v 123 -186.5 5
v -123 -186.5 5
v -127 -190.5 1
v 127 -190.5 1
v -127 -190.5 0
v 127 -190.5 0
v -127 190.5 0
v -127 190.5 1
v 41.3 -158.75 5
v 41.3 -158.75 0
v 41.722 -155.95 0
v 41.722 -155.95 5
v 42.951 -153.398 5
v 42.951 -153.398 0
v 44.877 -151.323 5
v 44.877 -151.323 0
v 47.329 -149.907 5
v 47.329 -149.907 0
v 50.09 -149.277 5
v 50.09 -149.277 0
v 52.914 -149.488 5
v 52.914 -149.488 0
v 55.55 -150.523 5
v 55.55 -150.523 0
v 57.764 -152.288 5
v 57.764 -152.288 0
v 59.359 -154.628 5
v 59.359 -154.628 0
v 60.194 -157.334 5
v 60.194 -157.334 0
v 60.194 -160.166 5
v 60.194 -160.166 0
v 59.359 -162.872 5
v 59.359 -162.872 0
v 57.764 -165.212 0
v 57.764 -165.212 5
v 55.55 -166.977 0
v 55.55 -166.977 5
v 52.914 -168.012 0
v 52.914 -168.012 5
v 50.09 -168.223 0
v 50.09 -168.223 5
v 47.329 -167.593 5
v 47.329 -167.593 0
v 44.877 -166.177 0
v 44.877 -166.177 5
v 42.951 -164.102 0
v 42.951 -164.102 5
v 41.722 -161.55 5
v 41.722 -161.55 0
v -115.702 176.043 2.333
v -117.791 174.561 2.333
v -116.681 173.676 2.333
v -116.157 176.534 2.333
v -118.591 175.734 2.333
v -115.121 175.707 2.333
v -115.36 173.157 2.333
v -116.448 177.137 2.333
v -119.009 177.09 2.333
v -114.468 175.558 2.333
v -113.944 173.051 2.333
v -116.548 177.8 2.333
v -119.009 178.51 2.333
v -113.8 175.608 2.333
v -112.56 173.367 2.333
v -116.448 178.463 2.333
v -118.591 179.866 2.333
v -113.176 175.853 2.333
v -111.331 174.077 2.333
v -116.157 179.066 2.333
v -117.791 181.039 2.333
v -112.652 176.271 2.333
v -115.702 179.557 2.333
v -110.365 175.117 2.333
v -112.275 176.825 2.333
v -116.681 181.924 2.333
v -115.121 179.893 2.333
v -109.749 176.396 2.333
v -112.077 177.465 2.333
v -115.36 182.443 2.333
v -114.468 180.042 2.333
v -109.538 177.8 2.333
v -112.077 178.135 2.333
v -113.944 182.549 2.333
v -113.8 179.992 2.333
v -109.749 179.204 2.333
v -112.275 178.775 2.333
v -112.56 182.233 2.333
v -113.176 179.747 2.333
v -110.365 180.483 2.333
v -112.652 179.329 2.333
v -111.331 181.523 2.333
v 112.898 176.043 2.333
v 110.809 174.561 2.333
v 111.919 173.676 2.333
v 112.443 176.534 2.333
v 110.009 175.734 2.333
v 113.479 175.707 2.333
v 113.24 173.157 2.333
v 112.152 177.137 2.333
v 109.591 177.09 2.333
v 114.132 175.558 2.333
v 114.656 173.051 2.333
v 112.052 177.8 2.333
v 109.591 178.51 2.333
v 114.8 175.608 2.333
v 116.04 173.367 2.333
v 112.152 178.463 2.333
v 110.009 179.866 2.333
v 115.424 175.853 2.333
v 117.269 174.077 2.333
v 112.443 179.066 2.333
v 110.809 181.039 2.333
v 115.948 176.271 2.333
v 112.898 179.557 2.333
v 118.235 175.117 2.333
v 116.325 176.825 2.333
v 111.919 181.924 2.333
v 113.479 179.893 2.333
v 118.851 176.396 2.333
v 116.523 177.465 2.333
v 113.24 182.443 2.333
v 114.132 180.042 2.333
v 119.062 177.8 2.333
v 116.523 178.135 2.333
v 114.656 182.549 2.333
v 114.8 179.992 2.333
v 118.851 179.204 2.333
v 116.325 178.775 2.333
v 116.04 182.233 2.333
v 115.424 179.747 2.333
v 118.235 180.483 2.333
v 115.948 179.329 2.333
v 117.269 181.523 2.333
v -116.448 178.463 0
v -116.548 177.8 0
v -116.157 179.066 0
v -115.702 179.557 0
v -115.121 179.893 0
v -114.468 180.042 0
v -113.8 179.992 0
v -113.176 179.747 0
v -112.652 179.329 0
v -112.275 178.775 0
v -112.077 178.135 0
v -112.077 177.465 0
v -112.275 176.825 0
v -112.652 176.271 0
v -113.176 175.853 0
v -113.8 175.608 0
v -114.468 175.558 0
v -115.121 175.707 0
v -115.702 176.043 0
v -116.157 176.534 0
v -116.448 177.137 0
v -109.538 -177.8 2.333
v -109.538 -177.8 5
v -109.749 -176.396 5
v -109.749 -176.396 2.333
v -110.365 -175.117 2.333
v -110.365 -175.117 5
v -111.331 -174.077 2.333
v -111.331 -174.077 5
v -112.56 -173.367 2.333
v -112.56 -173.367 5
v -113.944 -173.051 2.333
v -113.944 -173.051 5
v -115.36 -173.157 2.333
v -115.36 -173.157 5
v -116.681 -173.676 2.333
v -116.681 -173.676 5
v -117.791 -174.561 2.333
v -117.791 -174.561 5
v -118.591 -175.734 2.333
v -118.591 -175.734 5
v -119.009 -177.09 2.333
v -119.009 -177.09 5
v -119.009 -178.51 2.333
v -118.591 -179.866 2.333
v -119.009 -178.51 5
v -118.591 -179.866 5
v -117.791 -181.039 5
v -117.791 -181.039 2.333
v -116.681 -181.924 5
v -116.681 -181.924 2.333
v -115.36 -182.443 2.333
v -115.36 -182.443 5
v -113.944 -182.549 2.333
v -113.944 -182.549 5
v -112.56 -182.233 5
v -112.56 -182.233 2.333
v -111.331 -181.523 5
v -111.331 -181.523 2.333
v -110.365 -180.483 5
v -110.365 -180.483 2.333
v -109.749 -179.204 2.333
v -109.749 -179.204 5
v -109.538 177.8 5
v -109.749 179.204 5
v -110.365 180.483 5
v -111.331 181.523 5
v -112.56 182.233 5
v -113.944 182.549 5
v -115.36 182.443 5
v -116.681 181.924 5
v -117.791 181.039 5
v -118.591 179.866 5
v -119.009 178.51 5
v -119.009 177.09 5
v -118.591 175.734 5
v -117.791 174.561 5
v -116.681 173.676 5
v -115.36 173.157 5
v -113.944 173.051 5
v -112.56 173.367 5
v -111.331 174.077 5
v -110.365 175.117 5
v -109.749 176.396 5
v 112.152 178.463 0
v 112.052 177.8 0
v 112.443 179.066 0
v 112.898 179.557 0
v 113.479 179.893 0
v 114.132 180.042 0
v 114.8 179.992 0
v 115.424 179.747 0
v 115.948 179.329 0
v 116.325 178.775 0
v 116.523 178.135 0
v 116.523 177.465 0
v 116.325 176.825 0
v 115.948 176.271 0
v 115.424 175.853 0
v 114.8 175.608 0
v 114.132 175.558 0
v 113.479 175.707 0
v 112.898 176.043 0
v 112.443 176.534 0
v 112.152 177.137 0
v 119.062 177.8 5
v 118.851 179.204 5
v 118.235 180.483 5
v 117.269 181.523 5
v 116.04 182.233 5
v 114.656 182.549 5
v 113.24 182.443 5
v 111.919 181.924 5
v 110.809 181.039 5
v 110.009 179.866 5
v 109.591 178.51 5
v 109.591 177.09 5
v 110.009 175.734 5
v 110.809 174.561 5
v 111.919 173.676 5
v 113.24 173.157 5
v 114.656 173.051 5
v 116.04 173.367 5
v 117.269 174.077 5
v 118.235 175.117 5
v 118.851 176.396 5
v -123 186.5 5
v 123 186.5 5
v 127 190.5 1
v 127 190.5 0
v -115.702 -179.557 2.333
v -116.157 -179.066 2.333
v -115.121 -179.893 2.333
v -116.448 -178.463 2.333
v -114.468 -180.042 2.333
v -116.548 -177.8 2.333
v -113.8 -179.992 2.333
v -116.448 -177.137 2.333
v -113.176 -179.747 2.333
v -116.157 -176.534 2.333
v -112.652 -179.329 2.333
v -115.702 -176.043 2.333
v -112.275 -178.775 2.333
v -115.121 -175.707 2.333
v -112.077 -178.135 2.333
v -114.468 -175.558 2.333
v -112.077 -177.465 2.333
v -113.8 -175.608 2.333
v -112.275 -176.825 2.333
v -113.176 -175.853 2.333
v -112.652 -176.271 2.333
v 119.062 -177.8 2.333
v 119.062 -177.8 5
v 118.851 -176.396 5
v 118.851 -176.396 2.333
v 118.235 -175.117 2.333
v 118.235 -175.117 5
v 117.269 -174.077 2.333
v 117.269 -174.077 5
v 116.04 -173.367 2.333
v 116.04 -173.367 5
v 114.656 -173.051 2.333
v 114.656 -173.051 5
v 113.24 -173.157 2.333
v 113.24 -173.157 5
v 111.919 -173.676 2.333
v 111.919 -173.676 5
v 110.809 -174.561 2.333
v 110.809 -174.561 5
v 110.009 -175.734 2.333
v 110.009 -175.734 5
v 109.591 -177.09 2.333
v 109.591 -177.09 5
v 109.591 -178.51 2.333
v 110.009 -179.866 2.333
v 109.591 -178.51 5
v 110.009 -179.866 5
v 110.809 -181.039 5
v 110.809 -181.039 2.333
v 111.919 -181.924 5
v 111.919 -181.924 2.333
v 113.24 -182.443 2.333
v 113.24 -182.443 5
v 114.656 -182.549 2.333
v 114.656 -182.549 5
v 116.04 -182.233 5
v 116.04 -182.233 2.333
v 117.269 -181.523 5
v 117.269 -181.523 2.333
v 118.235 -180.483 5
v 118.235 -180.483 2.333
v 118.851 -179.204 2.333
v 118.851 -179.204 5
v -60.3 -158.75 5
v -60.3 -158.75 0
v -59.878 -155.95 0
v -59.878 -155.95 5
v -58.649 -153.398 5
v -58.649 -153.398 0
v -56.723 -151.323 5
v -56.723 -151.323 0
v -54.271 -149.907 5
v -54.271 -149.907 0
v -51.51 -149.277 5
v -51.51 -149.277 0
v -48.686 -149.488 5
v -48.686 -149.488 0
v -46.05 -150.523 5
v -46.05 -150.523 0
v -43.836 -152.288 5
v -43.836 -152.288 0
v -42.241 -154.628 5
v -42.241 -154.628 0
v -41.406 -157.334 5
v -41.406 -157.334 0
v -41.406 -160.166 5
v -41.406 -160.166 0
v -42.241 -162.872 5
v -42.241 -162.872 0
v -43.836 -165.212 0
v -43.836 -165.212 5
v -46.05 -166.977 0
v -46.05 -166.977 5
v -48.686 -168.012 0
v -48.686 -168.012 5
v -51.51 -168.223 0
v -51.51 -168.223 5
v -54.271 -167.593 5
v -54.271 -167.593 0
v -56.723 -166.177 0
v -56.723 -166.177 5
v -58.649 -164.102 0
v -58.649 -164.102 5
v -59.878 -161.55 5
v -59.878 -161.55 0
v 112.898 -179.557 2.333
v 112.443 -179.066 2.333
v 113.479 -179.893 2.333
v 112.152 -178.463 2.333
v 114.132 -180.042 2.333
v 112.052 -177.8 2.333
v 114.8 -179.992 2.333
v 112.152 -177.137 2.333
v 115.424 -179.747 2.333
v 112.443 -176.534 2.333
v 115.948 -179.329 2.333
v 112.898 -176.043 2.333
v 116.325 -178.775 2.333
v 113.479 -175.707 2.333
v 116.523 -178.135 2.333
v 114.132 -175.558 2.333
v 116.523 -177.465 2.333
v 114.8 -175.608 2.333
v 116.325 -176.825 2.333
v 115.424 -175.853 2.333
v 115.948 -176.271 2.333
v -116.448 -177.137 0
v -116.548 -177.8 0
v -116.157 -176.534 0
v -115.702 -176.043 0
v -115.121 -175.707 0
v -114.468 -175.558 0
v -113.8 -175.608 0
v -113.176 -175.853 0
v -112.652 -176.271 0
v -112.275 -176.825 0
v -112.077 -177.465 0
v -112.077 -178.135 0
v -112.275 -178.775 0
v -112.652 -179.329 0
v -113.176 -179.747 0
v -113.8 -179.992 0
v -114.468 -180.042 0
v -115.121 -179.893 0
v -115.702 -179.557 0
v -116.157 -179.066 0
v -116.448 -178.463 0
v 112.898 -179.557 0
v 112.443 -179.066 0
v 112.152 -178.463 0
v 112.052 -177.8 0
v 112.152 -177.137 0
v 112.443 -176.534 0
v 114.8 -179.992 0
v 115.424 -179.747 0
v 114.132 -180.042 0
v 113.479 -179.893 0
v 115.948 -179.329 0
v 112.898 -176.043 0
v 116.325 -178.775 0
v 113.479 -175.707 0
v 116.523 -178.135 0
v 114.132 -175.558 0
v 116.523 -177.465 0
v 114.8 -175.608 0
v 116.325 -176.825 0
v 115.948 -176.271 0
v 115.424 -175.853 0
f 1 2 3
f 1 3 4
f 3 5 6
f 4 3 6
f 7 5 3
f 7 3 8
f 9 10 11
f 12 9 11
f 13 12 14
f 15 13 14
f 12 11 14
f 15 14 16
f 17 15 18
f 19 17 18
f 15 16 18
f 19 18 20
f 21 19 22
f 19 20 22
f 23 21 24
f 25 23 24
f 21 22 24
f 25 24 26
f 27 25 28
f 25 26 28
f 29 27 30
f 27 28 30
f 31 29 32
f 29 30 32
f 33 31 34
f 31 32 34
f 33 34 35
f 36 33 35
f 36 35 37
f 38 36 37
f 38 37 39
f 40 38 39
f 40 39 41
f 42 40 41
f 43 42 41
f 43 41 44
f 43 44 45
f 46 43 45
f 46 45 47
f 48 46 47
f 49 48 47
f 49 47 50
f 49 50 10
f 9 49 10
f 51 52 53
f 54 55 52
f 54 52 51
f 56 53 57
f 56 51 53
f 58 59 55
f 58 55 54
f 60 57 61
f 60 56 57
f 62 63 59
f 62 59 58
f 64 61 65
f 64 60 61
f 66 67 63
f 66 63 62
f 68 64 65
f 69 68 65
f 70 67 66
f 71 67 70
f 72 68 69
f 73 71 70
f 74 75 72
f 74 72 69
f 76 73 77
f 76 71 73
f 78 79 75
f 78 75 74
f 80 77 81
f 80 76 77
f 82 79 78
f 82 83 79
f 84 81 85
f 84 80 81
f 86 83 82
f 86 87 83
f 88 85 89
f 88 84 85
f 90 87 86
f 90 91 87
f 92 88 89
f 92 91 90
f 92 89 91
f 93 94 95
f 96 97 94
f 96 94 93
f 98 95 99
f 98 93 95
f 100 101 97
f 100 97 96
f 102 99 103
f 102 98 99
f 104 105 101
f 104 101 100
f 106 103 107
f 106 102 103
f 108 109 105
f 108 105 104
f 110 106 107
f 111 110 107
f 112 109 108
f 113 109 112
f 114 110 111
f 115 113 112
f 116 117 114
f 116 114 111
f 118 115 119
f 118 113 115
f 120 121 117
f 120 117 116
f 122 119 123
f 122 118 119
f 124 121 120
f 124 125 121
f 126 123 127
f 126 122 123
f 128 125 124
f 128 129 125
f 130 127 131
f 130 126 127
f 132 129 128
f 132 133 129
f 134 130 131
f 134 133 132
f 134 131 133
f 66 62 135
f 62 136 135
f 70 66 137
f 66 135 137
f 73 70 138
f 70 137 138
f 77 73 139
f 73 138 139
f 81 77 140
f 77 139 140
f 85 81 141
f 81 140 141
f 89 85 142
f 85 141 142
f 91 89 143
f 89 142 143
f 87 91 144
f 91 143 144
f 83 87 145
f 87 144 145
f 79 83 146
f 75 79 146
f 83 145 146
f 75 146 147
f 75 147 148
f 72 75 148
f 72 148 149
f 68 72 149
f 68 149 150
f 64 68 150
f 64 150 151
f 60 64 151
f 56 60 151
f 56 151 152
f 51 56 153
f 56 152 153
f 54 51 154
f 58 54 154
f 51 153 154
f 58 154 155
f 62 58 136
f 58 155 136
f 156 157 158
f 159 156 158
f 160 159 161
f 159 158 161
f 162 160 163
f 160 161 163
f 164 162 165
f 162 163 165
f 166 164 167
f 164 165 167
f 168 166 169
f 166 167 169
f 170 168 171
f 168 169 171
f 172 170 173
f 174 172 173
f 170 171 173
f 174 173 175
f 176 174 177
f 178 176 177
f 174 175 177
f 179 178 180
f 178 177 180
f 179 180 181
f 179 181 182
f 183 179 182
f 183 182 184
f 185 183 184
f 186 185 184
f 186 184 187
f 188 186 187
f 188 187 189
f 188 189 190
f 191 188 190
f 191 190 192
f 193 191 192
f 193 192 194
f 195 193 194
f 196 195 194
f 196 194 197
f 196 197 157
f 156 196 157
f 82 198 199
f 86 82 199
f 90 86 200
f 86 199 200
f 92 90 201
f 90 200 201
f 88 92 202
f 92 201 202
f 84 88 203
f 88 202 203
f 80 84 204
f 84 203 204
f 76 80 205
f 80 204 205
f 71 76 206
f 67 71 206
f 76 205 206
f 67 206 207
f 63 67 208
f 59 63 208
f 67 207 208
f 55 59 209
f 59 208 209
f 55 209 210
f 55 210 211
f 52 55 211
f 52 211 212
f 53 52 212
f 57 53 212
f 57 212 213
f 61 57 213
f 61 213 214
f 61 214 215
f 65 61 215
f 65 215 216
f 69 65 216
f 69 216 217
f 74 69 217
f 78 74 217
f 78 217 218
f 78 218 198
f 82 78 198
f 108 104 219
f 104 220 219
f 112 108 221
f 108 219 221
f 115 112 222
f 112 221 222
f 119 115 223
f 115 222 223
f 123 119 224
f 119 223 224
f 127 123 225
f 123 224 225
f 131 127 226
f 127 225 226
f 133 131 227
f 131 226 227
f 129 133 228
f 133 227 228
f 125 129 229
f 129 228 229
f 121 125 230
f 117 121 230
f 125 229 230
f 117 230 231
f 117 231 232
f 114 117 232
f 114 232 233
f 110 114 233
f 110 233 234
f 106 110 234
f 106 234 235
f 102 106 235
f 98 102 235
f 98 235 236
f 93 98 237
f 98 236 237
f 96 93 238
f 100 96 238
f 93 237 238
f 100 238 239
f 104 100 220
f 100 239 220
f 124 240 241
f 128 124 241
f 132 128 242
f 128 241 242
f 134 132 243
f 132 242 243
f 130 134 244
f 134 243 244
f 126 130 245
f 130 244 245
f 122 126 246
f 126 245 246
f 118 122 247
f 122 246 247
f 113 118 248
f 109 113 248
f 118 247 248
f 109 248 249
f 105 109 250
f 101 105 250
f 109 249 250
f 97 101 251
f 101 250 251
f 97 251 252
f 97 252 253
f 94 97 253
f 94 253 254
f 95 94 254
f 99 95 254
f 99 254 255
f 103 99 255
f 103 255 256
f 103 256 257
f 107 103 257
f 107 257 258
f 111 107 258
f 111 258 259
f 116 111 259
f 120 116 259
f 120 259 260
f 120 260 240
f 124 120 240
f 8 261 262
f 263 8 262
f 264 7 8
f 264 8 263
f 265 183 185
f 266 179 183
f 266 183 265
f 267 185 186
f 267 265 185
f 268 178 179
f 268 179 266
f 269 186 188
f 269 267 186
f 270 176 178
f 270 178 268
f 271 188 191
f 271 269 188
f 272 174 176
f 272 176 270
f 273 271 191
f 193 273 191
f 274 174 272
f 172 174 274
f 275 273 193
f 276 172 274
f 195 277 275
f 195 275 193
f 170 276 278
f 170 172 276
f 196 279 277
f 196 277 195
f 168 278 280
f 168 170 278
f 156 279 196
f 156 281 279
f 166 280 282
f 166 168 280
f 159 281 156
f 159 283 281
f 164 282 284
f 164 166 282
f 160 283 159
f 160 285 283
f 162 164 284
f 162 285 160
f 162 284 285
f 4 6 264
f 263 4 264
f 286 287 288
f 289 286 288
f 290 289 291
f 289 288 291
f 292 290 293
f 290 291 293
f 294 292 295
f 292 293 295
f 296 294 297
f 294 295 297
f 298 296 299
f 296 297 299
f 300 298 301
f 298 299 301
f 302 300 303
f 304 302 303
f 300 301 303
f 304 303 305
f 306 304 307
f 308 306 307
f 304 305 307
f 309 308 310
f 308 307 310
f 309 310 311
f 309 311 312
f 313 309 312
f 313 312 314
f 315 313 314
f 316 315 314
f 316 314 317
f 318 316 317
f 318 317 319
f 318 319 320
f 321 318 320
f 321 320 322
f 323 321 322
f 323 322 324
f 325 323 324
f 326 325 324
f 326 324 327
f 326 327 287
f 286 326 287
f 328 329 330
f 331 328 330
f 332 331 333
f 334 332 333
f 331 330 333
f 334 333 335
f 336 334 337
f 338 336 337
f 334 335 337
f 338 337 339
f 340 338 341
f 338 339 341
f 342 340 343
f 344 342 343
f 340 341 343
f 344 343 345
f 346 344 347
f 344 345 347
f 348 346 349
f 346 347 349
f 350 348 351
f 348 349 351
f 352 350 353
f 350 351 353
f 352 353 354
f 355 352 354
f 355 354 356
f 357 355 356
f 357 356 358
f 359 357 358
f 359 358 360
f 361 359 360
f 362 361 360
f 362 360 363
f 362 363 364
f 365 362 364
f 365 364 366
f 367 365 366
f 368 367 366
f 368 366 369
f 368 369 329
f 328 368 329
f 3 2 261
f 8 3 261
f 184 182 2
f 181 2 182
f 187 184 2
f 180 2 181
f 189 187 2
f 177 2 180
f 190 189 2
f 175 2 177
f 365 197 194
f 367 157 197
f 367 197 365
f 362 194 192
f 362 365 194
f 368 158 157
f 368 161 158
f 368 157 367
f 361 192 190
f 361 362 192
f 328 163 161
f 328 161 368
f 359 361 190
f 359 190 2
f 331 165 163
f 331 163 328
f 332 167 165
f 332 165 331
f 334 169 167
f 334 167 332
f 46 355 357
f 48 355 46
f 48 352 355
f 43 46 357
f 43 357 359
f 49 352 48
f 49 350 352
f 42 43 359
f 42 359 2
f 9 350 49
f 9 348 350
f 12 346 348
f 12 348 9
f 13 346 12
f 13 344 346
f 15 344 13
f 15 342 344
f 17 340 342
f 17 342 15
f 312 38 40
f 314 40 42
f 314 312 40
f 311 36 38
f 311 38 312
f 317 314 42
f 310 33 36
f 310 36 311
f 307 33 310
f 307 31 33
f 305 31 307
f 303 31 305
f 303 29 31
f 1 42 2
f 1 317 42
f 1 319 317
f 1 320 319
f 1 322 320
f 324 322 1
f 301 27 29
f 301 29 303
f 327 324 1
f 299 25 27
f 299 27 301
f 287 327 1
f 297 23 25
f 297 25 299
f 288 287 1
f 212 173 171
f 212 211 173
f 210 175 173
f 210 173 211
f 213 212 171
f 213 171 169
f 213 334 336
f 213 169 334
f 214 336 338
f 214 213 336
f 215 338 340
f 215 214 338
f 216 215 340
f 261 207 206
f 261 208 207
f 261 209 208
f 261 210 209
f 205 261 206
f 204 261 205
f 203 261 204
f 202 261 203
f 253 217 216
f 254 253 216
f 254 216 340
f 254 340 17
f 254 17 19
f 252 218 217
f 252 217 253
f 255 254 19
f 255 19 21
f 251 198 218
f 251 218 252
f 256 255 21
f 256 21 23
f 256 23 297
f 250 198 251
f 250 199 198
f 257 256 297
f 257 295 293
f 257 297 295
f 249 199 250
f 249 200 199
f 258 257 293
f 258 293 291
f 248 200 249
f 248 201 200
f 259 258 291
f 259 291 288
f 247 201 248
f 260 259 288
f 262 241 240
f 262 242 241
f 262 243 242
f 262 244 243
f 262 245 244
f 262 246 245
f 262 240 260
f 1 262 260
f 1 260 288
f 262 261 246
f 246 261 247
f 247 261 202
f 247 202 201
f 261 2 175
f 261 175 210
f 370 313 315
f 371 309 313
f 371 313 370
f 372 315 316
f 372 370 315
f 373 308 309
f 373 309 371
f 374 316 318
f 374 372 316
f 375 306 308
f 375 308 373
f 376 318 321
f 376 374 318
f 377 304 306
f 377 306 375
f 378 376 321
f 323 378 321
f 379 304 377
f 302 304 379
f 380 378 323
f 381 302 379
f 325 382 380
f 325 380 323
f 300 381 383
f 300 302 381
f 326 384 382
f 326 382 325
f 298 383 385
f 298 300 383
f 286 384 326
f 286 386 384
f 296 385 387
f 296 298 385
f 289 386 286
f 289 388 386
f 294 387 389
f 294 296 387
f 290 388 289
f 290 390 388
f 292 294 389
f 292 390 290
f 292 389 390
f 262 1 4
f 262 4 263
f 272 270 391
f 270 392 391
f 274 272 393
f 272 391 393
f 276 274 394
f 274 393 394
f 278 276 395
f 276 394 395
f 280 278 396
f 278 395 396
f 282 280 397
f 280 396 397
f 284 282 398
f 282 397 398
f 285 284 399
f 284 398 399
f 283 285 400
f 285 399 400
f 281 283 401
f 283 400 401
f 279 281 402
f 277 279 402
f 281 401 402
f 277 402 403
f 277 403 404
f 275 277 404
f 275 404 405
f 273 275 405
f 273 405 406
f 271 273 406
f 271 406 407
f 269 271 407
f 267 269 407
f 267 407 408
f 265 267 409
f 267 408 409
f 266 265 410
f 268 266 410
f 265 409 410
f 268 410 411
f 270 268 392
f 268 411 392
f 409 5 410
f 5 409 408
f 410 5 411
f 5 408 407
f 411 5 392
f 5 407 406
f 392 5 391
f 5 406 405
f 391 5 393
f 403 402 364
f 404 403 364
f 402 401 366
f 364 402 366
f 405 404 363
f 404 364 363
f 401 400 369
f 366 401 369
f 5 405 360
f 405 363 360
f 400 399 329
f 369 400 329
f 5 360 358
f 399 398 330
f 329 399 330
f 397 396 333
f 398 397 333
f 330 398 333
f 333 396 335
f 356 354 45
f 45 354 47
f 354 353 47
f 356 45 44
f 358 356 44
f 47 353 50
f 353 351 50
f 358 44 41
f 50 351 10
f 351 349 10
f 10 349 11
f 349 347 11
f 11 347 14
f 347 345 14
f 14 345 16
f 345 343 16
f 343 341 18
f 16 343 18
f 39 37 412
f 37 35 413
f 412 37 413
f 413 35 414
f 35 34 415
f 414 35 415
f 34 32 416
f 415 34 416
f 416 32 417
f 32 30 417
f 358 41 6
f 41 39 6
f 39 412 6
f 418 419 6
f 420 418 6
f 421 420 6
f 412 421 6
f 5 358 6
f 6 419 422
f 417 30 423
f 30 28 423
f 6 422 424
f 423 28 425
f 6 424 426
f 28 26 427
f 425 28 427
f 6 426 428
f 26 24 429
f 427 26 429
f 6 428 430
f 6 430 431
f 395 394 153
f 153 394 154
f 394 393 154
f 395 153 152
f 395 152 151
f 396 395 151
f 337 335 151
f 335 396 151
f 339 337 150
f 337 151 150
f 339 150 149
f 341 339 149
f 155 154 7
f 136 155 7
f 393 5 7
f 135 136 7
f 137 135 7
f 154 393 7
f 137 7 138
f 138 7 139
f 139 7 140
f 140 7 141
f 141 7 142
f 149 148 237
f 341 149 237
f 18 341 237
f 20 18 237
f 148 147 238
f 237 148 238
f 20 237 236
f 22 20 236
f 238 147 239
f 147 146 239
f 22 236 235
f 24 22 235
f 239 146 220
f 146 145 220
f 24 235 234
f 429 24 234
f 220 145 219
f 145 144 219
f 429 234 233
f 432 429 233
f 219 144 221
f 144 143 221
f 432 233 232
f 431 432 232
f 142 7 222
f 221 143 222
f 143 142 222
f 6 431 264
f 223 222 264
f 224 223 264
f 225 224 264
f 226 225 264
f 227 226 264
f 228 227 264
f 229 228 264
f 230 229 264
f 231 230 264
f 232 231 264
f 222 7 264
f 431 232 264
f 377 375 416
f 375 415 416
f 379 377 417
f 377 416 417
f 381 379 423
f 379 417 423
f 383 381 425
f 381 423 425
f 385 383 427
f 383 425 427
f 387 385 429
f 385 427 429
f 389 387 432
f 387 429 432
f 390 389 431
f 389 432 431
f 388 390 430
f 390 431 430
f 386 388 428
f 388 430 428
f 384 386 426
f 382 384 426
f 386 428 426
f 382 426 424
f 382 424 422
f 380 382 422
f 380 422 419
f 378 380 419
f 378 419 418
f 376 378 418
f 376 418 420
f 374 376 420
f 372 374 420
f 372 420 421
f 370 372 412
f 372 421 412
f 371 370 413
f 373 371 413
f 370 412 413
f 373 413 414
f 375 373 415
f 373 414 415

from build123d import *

# Parameters (mm, degrees)
SKETCH1_W                                           = 254
SKETCH1_H                                           = 381
BOSS_EXTRUDE1_DEPTH                                 = 5
CHAMFER1_SIZE                                       = 4
CBORE_FOR_8_BINDING_HEAD_MACHINE_SCREW1_D           = 4.4958
CBORE_FOR_8_BINDING_HEAD_MACHINE_SCREW1_CBORE_D     = 9.525
CBORE_FOR_8_BINDING_HEAD_MACHINE_SCREW1_CBORE_DEPTH = 2.667
LPATTERN1_COUNT                                     = 2
LPATTERN1_PITCH                                     = 355.6
LPATTERN1_COUNT_DIR2                                = 2
LPATTERN1_PITCH_DIR2                                = 228.6
F_19_0_19_DIAMETER_HOLE1_D                          = 19


with BuildPart() as part:
    # Sketch1 → Boss-Extrude1 (new body)
    with BuildSketch(Plane.XY):
        Rectangle(SKETCH1_W, SKETCH1_H)
    extrude(amount=BOSS_EXTRUDE1_DEPTH)

    # Chamfer1
    chamfer1_edges = [part.edges().sort_by_distance(p)[0] for p in [
        (127, 0, 5),
        (0, 190.5, 5),
        (-127, 0, 5),
        (0, -190.5, 5),
    ]]
    chamfer(chamfer1_edges, length=CHAMFER1_SIZE)

    # CBORE for #8 Binding Head Machine Screw1 (through all)
    with Locations(Plane.XY.offset(5)):
        with Locations((-114.3, 177.8)):
            cbore_for_8_binding_head_machine_screw1 = CounterBoreHole(CBORE_FOR_8_BINDING_HEAD_MACHINE_SCREW1_D / 2, CBORE_FOR_8_BINDING_HEAD_MACHINE_SCREW1_CBORE_D / 2, CBORE_FOR_8_BINDING_HEAD_MACHINE_SCREW1_CBORE_DEPTH)

    # LPattern1: CBORE for _8 Binding Head Machine Screw1 2 × 2
    with Locations(*[(j * LPATTERN1_PITCH_DIR2, -i * LPATTERN1_PITCH, 0) for i in range(LPATTERN1_COUNT) for j in range(LPATTERN1_COUNT_DIR2) if (i, j) != (0, 0)]):
        add(cbore_for_8_binding_head_machine_screw1, mode=Mode.SUBTRACT)

    # Ø19.0 (19) Diameter Hole1 (through all)
    with Locations(Plane.XY.offset(5)):
        with Locations((-50.8, -158.75), (50.8, -158.75)):
            Hole(F_19_0_19_DIAMETER_HOLE1_D / 2)


solid = part.part
